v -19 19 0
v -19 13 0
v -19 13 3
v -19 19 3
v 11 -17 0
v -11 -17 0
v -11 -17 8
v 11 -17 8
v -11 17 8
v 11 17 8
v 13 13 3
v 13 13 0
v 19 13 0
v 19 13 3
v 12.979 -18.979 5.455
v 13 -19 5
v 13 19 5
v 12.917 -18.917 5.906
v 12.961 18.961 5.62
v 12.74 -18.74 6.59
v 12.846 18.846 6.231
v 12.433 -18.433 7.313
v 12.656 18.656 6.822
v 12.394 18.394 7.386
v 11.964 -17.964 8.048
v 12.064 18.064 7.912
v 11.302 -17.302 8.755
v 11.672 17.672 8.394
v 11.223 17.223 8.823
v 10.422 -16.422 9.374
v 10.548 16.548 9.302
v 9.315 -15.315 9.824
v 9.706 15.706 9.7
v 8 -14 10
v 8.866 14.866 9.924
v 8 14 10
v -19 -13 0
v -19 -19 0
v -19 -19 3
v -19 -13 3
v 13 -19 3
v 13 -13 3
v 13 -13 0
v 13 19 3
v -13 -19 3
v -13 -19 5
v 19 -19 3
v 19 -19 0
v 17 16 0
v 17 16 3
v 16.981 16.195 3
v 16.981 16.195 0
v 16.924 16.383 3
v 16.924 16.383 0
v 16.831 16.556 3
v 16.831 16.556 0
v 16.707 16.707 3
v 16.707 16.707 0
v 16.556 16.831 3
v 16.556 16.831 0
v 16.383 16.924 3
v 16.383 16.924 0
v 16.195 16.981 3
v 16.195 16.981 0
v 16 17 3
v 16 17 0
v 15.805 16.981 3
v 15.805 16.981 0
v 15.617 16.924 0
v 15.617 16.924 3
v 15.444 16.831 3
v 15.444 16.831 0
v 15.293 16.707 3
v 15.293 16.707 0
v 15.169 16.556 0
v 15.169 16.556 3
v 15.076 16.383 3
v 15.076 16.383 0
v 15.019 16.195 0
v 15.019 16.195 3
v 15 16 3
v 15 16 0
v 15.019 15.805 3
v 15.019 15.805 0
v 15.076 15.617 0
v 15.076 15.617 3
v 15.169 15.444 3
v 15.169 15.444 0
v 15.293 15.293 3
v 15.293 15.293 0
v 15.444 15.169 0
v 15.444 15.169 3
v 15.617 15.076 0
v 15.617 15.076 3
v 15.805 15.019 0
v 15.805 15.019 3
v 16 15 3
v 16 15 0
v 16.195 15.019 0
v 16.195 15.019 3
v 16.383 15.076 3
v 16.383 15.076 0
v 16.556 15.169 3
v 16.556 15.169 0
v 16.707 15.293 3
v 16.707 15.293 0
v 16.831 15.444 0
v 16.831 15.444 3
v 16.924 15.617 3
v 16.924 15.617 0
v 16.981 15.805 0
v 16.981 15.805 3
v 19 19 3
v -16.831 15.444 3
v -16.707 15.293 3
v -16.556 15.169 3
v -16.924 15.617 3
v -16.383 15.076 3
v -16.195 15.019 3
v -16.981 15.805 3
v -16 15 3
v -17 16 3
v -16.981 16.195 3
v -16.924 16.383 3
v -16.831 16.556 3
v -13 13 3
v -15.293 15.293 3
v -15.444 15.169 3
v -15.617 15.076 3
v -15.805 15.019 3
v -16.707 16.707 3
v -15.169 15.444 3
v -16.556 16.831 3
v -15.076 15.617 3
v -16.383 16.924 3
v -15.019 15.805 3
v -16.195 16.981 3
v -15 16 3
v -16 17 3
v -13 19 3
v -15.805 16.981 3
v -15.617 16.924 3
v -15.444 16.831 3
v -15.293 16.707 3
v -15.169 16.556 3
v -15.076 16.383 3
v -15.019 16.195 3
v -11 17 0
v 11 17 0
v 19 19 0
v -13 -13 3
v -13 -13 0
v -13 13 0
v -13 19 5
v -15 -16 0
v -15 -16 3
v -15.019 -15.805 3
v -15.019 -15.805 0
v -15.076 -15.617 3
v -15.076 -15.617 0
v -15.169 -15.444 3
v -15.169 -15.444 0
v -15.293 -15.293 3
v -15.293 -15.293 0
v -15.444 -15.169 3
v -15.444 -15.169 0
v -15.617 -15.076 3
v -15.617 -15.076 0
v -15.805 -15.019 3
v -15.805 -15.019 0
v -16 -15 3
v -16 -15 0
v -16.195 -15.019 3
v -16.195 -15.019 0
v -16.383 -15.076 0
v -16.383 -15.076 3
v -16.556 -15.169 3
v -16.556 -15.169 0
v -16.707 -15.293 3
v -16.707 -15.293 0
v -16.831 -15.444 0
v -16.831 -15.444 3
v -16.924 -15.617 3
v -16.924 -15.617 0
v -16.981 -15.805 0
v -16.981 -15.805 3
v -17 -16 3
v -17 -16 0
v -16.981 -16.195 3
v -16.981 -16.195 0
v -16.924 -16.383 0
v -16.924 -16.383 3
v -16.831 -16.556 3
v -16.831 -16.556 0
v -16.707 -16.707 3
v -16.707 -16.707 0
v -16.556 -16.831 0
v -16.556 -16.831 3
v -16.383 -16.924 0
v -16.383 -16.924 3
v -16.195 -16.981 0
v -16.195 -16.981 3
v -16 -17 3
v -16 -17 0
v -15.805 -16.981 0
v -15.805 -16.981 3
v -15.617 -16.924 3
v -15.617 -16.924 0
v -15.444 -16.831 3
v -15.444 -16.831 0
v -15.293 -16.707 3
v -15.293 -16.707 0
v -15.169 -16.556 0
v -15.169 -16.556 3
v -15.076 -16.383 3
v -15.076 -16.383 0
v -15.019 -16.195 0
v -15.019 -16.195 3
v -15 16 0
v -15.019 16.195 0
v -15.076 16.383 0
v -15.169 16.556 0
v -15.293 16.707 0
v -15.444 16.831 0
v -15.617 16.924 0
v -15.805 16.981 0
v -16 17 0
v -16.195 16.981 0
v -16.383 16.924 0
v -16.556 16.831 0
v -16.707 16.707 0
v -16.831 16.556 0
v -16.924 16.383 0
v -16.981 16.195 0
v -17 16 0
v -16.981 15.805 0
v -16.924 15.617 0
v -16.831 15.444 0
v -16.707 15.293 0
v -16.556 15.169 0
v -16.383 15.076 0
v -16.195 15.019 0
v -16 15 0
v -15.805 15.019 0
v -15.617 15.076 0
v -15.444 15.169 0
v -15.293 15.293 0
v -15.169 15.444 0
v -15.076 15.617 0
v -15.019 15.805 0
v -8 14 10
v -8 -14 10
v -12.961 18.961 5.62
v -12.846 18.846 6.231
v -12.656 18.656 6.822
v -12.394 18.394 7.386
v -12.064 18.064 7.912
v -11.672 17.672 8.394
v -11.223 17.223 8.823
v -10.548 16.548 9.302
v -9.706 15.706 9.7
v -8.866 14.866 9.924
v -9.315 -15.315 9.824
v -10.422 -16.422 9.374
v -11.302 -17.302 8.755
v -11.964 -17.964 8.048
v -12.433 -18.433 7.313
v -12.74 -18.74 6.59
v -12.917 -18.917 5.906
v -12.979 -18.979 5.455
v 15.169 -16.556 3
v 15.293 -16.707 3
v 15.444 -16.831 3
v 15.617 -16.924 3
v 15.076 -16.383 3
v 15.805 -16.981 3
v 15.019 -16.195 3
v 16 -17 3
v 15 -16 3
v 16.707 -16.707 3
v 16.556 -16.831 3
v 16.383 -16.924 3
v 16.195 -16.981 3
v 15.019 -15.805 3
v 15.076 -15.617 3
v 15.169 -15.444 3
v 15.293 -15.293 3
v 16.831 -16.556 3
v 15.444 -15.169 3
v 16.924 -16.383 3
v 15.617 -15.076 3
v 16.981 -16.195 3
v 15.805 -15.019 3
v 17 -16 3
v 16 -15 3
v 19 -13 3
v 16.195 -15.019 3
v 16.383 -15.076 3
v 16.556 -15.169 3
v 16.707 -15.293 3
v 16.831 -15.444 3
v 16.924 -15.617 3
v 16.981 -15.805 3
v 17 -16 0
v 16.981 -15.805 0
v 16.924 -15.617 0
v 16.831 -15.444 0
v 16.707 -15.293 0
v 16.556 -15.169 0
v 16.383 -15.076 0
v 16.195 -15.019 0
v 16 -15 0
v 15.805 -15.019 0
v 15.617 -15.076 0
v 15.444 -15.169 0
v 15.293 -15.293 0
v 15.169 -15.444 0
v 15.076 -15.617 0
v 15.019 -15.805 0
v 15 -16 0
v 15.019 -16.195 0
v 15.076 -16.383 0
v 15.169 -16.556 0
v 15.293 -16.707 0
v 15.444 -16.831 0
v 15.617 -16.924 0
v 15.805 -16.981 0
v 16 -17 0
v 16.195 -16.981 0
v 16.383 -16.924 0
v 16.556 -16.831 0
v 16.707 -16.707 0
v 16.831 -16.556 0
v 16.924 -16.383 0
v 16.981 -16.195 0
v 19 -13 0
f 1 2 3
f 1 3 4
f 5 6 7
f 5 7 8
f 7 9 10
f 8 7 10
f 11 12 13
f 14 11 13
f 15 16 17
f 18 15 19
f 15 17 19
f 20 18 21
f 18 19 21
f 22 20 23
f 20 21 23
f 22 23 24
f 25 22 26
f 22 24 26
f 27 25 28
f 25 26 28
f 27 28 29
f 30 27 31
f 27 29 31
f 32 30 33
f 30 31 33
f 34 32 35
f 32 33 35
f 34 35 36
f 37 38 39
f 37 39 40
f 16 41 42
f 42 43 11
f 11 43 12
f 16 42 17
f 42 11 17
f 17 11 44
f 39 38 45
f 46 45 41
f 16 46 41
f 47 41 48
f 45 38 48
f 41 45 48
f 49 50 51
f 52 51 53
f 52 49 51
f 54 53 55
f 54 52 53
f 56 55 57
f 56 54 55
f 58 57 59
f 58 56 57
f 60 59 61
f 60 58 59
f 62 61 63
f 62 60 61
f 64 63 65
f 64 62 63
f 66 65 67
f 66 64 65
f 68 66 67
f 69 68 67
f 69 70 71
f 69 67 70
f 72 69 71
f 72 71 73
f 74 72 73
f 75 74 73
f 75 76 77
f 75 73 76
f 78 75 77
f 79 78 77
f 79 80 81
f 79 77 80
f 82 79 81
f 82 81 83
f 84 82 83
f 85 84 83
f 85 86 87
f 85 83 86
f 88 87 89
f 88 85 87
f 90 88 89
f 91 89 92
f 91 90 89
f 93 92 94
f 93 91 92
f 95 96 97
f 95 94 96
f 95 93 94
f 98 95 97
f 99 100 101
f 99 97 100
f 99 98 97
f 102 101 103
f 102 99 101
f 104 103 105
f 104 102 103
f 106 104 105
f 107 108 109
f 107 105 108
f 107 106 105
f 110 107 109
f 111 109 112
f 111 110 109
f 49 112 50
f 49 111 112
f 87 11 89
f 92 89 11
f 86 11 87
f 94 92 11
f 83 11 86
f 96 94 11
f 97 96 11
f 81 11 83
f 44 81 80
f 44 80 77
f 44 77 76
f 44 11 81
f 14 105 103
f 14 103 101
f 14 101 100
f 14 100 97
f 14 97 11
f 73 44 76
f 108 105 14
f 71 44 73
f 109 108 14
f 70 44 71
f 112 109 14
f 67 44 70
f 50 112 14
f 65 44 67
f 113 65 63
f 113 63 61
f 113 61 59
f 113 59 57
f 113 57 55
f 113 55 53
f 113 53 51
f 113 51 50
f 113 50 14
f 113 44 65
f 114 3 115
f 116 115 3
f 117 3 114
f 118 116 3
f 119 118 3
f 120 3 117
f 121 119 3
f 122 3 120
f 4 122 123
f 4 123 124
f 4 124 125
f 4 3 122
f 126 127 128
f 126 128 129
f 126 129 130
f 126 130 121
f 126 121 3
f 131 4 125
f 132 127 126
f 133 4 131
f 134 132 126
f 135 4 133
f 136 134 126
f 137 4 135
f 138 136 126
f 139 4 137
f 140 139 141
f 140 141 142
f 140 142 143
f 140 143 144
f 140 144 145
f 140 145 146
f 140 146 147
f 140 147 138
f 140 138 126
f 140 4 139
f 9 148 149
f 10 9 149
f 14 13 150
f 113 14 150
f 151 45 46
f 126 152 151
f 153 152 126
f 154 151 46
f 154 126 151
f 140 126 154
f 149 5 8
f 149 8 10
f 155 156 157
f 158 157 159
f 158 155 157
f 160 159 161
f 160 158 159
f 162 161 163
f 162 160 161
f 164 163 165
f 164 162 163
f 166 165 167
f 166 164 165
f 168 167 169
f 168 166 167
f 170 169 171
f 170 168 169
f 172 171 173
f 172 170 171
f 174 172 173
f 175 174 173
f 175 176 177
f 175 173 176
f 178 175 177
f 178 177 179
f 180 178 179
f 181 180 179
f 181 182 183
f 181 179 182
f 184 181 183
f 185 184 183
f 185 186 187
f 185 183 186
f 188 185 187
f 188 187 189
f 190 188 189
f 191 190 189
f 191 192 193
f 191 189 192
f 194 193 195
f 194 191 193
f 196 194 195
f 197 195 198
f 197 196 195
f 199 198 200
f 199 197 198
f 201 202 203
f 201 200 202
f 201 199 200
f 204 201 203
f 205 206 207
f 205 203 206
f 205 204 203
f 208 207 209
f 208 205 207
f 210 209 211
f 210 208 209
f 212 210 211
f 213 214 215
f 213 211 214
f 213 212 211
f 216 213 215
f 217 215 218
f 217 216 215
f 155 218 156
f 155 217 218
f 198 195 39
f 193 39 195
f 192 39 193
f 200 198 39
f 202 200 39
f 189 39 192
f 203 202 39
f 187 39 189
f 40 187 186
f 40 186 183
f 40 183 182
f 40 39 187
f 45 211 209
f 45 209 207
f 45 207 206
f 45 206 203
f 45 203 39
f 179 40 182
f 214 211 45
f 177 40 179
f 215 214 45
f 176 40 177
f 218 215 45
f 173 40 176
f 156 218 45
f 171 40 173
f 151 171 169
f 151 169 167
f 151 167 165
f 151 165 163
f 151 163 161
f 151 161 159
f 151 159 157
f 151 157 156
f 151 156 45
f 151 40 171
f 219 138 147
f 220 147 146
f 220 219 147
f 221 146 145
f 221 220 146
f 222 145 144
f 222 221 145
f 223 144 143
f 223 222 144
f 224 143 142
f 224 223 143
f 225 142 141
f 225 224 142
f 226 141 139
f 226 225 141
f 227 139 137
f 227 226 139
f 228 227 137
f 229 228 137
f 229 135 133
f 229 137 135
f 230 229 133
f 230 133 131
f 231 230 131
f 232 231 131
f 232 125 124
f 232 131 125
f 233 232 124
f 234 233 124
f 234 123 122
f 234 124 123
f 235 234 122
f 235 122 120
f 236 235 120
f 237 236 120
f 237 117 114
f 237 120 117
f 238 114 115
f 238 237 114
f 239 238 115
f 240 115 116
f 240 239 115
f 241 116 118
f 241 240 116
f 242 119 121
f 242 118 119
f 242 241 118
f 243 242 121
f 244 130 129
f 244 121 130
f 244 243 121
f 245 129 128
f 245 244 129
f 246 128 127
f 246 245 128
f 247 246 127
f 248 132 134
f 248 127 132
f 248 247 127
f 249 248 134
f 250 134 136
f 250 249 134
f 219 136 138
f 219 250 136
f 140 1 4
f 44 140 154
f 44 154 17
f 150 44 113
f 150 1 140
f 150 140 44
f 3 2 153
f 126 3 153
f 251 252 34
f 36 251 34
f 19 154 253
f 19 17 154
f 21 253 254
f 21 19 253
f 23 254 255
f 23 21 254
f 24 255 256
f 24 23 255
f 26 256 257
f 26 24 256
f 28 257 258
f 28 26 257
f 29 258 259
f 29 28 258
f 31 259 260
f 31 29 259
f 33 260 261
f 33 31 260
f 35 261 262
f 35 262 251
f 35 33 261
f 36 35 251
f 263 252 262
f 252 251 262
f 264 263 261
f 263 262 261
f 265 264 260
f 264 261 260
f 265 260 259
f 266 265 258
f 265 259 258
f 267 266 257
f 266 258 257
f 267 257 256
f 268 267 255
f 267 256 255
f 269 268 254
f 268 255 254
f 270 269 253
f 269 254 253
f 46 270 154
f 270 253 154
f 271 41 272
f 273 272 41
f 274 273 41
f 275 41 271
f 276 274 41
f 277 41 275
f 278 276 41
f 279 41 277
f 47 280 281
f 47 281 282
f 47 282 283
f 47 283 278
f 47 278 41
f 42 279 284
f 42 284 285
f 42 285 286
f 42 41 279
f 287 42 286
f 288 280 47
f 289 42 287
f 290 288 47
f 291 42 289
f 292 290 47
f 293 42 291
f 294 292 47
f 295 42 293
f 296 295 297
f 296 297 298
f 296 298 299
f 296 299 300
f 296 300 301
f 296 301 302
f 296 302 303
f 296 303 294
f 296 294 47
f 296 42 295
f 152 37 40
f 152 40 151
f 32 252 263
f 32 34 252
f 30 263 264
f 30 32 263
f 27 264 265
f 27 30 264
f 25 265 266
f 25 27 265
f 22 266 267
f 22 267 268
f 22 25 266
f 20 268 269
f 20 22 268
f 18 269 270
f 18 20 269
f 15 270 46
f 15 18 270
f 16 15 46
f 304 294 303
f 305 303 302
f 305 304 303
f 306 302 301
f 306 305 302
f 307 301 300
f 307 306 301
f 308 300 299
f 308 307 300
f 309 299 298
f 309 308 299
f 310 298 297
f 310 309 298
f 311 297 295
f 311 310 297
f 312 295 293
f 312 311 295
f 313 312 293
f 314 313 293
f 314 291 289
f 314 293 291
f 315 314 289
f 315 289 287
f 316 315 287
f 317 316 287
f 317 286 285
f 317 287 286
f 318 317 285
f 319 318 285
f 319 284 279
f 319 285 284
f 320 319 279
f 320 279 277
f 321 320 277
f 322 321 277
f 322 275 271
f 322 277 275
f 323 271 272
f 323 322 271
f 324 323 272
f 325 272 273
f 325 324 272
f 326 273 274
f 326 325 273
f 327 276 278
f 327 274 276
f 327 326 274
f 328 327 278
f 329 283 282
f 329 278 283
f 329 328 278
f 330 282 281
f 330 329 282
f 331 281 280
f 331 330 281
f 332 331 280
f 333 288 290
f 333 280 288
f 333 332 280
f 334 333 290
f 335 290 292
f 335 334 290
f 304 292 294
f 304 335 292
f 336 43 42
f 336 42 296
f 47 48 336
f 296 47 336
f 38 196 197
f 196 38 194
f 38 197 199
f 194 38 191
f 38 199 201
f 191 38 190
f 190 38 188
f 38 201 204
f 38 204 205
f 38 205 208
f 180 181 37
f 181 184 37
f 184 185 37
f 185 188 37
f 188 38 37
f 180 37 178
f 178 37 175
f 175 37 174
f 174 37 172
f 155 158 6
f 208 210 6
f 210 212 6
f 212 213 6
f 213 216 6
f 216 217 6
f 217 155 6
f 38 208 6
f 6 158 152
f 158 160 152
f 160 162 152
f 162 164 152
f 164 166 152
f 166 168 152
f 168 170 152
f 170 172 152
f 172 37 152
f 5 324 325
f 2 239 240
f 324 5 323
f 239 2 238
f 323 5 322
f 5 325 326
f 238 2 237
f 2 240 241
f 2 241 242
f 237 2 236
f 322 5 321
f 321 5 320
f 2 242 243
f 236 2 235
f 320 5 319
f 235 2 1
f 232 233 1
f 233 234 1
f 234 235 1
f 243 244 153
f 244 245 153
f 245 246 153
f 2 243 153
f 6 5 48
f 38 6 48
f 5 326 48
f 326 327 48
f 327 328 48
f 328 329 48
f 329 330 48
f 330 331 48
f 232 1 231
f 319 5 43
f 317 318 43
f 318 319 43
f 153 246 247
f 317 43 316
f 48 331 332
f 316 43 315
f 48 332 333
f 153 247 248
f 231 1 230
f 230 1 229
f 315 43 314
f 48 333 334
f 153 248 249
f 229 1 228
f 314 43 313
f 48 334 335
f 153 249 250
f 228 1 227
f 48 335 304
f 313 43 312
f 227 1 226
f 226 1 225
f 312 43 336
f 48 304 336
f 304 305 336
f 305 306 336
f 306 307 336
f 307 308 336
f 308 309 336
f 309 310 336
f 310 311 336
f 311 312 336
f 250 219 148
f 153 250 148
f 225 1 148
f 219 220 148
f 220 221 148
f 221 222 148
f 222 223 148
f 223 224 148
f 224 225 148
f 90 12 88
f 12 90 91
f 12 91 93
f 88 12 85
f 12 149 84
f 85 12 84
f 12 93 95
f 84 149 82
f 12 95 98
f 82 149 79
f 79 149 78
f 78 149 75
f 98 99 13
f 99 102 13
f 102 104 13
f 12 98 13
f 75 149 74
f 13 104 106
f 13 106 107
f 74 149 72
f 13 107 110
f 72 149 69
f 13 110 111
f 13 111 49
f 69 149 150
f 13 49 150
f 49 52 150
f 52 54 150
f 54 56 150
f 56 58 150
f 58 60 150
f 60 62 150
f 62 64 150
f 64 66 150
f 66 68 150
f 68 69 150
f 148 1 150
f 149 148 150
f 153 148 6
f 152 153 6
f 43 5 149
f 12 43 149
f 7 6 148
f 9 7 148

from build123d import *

# Parameters (mm, degrees)
SKETCH_1_W          = 26
SKETCH_1_H          = 38
EXTRUDE_1_DEPTH     = 10
SKETCH_2_W          = 22
SKETCH_2_H          = 34
CUT_EXTRUDE_1_DEPTH = 8
SKETCH_4_W          = 6
SKETCH_4_H          = 6
EXTRUDE_2_DEPTH     = 3
SKETCH_5_R          = 1
CUT_EXTRUDE_4_DEPTH = 11
FILLET_1_R          = 5


with BuildPart() as part:
    # ｽｹｯﾁ1 → ﾎﾞｽ - 押し出し1 (new body)
    with BuildSketch(Plane.XY):
        Rectangle(SKETCH_1_W, SKETCH_1_H)
    extrude(amount=EXTRUDE_1_DEPTH)

    # ｽｹｯﾁ2 → ｶｯﾄ - 押し出し1 (cut)
    with BuildSketch(Plane.XY):
        Rectangle(SKETCH_2_W, SKETCH_2_H)
    extrude(amount=CUT_EXTRUDE_1_DEPTH, mode=Mode.SUBTRACT)

    # ｽｹｯﾁ4 → ﾎﾞｽ - 押し出し2 (add)
    with BuildSketch(Plane.XY):
        with Locations((16, 16)):
            Rectangle(SKETCH_4_W, SKETCH_4_H)
        with Locations((16, -16)):
            Rectangle(SKETCH_4_W, SKETCH_4_H)
        with Locations((-16, -16)):
            Rectangle(SKETCH_4_W, SKETCH_4_H)
        with Locations((-16, 16)):
            Rectangle(SKETCH_4_W, SKETCH_4_H)
    extrude(amount=EXTRUDE_2_DEPTH)

    # ｽｹｯﾁ5 → ｶｯﾄ - 押し出し4 (cut, through all)
    with BuildSketch(Plane.XY):
        with Locations((-16, 16)):
            Circle(SKETCH_5_R)
        with Locations((-16, -16)):
            Circle(SKETCH_5_R)
        with Locations((16, -16)):
            Circle(SKETCH_5_R)
        with Locations((16, 16)):
            Circle(SKETCH_5_R)
    extrude(amount=CUT_EXTRUDE_4_DEPTH, mode=Mode.SUBTRACT)

    # ﾌｨﾚｯﾄ1
    fillet_1_edges = [part.edges().sort_by_distance(p)[0] for p in [
        (0, 19, 10),
        (0, -19, 10),
        (13, 0, 10),
        (-13, 0, 10),
    ]]
    fillet(fillet_1_edges, radius=FILLET_1_R)


solid = part.part
